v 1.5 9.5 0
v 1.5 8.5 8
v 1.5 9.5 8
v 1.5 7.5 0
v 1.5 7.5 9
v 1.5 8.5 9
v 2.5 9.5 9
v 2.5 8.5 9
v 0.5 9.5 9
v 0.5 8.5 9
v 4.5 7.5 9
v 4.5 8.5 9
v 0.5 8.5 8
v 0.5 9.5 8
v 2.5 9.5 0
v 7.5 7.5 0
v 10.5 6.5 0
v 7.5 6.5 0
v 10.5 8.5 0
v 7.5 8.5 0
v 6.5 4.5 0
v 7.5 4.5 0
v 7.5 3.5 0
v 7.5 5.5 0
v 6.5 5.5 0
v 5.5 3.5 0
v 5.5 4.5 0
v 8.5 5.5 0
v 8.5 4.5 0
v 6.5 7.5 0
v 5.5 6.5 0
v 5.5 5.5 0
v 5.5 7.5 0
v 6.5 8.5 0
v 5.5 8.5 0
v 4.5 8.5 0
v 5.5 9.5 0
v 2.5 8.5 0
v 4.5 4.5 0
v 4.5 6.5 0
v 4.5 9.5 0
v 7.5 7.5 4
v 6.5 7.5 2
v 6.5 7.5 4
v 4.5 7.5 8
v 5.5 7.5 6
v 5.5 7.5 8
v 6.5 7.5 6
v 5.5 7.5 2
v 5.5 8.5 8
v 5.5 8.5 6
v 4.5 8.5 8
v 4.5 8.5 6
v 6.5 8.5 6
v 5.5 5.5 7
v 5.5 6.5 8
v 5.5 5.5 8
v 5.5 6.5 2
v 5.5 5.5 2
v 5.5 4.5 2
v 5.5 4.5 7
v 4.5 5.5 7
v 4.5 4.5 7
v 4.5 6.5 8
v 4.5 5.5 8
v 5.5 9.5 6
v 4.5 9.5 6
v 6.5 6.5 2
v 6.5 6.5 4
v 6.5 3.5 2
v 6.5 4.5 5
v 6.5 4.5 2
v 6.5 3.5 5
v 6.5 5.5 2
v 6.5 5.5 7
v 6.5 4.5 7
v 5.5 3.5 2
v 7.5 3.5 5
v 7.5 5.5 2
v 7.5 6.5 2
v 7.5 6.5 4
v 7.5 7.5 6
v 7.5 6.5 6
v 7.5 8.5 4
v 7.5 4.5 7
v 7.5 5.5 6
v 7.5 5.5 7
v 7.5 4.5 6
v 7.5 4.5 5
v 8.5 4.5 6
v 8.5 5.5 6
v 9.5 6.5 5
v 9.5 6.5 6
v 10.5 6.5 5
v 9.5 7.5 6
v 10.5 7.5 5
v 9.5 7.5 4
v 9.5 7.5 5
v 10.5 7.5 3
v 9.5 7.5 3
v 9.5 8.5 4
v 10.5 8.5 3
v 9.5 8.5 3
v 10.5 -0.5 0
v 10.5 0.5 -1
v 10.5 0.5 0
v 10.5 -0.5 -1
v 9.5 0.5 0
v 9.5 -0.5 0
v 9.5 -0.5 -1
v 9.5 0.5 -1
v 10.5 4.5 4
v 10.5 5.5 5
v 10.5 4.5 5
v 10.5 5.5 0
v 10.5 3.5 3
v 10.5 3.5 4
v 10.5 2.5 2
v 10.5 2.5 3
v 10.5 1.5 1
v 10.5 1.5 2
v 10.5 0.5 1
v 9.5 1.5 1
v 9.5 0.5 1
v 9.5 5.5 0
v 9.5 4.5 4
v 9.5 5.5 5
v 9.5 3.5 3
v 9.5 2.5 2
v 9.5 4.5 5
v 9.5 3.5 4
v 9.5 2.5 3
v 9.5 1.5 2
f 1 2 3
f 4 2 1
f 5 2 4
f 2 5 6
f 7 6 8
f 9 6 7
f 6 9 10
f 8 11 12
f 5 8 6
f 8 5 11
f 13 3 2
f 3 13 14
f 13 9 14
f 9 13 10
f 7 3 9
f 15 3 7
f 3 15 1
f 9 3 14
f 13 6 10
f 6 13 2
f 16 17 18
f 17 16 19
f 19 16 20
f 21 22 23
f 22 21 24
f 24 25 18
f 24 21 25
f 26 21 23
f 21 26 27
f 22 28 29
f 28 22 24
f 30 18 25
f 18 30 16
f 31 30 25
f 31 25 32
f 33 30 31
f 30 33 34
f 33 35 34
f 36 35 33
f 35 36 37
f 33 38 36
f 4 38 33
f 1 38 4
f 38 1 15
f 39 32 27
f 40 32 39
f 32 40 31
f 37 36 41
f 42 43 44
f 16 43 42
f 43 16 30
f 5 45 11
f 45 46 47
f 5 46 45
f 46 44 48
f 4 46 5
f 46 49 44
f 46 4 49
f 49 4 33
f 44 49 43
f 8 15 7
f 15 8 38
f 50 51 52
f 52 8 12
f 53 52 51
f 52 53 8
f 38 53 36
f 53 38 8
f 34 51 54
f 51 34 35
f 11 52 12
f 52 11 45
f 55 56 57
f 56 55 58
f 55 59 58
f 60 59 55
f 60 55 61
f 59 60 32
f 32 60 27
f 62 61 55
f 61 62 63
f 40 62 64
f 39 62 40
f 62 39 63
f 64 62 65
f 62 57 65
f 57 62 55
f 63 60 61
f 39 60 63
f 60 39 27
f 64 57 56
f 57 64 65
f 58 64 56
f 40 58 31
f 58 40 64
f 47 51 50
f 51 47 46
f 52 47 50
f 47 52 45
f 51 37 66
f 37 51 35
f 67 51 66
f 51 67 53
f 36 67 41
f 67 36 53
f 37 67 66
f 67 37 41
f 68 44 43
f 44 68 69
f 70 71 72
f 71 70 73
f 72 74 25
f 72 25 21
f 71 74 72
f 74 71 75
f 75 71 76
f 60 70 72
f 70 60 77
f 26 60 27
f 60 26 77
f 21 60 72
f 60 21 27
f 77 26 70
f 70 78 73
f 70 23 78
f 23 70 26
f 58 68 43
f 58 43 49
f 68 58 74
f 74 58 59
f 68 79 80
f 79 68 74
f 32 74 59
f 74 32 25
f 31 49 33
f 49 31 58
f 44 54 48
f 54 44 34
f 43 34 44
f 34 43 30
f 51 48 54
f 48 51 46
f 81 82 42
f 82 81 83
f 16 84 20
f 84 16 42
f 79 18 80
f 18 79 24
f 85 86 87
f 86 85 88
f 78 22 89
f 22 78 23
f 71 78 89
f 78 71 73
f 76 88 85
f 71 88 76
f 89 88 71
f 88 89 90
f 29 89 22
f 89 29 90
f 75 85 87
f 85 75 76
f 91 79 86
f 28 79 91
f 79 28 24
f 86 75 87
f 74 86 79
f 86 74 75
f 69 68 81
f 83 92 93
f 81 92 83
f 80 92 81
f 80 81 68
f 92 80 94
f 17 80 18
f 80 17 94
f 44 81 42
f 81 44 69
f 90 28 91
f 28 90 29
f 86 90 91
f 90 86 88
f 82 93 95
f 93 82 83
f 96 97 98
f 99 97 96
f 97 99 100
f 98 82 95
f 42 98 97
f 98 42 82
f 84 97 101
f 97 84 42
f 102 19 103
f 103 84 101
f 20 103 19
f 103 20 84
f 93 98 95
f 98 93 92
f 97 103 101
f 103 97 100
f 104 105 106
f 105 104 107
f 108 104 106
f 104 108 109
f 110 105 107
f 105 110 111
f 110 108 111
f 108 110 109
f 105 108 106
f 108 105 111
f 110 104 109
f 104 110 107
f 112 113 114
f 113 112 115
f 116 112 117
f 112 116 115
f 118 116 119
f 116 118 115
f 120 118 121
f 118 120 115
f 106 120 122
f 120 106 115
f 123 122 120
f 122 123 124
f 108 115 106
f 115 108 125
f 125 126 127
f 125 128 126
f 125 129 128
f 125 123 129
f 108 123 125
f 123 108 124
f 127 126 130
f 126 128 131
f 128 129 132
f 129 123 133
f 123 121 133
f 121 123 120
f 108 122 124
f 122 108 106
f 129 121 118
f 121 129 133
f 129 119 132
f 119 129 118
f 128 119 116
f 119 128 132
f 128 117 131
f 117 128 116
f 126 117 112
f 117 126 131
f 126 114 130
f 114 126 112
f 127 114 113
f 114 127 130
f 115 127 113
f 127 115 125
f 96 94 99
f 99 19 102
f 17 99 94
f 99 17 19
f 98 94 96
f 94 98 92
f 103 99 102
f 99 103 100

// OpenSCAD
union() {
    translate([1, 9, 8.5]) color([0, 0, 1]) cube([1, 1, 1], center=true);
    translate([2, 8, 4.5]) cube([1, 1, 9], center=true);
    translate([2, 9, 4.5]) cube([1, 1, 9], center=true);
    translate([3, 8, 4.5]) cube([1, 1, 9], center=true);
    translate([4, 8, 4.5]) cube([1, 1, 9], center=true);
    translate([5, 5, 3.5]) cube([1, 1, 7], center=true);
    translate([5, 6, 4.0]) cube([1, 1, 8], center=true);
    translate([5, 8, 4.0]) cube([1, 1, 8], center=true);
    translate([5, 9, 3.0]) cube([1, 1, 6], center=true);
    translate([6, 4, 1.0]) cube([1, 1, 2], center=true);
    translate([6, 6, 1.0]) cube([1, 1, 2], center=true);
    translate([6, 7, 1.0]) cube([1, 1, 2], center=true);
    translate([6, 8, 3.0]) cube([1, 1, 6], center=true);
    translate([7, 4, 2.5]) cube([1, 1, 5], center=true);
    translate([7, 5, 3.5]) cube([1, 1, 7], center=true);
    translate([7, 6, 1.0]) cube([1, 1, 2], center=true);
    translate([7, 7, 2.0]) cube([1, 1, 4], center=true);
    translate([8, 5, 3.0]) cube([1, 1, 6], center=true);
    translate([8, 7, 3.0]) cube([1, 1, 6], center=true);
    translate([8, 8, 2.0]) cube([1, 1, 4], center=true);
    translate([9, 7, 3.0]) cube([1, 1, 6], center=true);
    translate([9, 8, 2.0]) cube([1, 1, 4], center=true);
    translate([10, 0, -0.5]) color([1, 0, 0]) cube([1, 1, 1], center=true);
    translate([10, 1, 0.5]) cube([1, 1, 1], center=true);
    translate([10, 2, 1.0]) cube([1, 1, 2], center=true);
    translate([10, 3, 1.5]) cube([1, 1, 3], center=true);
    translate([10, 4, 2.0]) cube([1, 1, 4], center=true);
    translate([10, 5, 2.5]) cube([1, 1, 5], center=true);
    translate([10, 7, 2.5]) cube([1, 1, 5], center=true);
    translate([10, 8, 1.5]) cube([1, 1, 3], center=true);
}
